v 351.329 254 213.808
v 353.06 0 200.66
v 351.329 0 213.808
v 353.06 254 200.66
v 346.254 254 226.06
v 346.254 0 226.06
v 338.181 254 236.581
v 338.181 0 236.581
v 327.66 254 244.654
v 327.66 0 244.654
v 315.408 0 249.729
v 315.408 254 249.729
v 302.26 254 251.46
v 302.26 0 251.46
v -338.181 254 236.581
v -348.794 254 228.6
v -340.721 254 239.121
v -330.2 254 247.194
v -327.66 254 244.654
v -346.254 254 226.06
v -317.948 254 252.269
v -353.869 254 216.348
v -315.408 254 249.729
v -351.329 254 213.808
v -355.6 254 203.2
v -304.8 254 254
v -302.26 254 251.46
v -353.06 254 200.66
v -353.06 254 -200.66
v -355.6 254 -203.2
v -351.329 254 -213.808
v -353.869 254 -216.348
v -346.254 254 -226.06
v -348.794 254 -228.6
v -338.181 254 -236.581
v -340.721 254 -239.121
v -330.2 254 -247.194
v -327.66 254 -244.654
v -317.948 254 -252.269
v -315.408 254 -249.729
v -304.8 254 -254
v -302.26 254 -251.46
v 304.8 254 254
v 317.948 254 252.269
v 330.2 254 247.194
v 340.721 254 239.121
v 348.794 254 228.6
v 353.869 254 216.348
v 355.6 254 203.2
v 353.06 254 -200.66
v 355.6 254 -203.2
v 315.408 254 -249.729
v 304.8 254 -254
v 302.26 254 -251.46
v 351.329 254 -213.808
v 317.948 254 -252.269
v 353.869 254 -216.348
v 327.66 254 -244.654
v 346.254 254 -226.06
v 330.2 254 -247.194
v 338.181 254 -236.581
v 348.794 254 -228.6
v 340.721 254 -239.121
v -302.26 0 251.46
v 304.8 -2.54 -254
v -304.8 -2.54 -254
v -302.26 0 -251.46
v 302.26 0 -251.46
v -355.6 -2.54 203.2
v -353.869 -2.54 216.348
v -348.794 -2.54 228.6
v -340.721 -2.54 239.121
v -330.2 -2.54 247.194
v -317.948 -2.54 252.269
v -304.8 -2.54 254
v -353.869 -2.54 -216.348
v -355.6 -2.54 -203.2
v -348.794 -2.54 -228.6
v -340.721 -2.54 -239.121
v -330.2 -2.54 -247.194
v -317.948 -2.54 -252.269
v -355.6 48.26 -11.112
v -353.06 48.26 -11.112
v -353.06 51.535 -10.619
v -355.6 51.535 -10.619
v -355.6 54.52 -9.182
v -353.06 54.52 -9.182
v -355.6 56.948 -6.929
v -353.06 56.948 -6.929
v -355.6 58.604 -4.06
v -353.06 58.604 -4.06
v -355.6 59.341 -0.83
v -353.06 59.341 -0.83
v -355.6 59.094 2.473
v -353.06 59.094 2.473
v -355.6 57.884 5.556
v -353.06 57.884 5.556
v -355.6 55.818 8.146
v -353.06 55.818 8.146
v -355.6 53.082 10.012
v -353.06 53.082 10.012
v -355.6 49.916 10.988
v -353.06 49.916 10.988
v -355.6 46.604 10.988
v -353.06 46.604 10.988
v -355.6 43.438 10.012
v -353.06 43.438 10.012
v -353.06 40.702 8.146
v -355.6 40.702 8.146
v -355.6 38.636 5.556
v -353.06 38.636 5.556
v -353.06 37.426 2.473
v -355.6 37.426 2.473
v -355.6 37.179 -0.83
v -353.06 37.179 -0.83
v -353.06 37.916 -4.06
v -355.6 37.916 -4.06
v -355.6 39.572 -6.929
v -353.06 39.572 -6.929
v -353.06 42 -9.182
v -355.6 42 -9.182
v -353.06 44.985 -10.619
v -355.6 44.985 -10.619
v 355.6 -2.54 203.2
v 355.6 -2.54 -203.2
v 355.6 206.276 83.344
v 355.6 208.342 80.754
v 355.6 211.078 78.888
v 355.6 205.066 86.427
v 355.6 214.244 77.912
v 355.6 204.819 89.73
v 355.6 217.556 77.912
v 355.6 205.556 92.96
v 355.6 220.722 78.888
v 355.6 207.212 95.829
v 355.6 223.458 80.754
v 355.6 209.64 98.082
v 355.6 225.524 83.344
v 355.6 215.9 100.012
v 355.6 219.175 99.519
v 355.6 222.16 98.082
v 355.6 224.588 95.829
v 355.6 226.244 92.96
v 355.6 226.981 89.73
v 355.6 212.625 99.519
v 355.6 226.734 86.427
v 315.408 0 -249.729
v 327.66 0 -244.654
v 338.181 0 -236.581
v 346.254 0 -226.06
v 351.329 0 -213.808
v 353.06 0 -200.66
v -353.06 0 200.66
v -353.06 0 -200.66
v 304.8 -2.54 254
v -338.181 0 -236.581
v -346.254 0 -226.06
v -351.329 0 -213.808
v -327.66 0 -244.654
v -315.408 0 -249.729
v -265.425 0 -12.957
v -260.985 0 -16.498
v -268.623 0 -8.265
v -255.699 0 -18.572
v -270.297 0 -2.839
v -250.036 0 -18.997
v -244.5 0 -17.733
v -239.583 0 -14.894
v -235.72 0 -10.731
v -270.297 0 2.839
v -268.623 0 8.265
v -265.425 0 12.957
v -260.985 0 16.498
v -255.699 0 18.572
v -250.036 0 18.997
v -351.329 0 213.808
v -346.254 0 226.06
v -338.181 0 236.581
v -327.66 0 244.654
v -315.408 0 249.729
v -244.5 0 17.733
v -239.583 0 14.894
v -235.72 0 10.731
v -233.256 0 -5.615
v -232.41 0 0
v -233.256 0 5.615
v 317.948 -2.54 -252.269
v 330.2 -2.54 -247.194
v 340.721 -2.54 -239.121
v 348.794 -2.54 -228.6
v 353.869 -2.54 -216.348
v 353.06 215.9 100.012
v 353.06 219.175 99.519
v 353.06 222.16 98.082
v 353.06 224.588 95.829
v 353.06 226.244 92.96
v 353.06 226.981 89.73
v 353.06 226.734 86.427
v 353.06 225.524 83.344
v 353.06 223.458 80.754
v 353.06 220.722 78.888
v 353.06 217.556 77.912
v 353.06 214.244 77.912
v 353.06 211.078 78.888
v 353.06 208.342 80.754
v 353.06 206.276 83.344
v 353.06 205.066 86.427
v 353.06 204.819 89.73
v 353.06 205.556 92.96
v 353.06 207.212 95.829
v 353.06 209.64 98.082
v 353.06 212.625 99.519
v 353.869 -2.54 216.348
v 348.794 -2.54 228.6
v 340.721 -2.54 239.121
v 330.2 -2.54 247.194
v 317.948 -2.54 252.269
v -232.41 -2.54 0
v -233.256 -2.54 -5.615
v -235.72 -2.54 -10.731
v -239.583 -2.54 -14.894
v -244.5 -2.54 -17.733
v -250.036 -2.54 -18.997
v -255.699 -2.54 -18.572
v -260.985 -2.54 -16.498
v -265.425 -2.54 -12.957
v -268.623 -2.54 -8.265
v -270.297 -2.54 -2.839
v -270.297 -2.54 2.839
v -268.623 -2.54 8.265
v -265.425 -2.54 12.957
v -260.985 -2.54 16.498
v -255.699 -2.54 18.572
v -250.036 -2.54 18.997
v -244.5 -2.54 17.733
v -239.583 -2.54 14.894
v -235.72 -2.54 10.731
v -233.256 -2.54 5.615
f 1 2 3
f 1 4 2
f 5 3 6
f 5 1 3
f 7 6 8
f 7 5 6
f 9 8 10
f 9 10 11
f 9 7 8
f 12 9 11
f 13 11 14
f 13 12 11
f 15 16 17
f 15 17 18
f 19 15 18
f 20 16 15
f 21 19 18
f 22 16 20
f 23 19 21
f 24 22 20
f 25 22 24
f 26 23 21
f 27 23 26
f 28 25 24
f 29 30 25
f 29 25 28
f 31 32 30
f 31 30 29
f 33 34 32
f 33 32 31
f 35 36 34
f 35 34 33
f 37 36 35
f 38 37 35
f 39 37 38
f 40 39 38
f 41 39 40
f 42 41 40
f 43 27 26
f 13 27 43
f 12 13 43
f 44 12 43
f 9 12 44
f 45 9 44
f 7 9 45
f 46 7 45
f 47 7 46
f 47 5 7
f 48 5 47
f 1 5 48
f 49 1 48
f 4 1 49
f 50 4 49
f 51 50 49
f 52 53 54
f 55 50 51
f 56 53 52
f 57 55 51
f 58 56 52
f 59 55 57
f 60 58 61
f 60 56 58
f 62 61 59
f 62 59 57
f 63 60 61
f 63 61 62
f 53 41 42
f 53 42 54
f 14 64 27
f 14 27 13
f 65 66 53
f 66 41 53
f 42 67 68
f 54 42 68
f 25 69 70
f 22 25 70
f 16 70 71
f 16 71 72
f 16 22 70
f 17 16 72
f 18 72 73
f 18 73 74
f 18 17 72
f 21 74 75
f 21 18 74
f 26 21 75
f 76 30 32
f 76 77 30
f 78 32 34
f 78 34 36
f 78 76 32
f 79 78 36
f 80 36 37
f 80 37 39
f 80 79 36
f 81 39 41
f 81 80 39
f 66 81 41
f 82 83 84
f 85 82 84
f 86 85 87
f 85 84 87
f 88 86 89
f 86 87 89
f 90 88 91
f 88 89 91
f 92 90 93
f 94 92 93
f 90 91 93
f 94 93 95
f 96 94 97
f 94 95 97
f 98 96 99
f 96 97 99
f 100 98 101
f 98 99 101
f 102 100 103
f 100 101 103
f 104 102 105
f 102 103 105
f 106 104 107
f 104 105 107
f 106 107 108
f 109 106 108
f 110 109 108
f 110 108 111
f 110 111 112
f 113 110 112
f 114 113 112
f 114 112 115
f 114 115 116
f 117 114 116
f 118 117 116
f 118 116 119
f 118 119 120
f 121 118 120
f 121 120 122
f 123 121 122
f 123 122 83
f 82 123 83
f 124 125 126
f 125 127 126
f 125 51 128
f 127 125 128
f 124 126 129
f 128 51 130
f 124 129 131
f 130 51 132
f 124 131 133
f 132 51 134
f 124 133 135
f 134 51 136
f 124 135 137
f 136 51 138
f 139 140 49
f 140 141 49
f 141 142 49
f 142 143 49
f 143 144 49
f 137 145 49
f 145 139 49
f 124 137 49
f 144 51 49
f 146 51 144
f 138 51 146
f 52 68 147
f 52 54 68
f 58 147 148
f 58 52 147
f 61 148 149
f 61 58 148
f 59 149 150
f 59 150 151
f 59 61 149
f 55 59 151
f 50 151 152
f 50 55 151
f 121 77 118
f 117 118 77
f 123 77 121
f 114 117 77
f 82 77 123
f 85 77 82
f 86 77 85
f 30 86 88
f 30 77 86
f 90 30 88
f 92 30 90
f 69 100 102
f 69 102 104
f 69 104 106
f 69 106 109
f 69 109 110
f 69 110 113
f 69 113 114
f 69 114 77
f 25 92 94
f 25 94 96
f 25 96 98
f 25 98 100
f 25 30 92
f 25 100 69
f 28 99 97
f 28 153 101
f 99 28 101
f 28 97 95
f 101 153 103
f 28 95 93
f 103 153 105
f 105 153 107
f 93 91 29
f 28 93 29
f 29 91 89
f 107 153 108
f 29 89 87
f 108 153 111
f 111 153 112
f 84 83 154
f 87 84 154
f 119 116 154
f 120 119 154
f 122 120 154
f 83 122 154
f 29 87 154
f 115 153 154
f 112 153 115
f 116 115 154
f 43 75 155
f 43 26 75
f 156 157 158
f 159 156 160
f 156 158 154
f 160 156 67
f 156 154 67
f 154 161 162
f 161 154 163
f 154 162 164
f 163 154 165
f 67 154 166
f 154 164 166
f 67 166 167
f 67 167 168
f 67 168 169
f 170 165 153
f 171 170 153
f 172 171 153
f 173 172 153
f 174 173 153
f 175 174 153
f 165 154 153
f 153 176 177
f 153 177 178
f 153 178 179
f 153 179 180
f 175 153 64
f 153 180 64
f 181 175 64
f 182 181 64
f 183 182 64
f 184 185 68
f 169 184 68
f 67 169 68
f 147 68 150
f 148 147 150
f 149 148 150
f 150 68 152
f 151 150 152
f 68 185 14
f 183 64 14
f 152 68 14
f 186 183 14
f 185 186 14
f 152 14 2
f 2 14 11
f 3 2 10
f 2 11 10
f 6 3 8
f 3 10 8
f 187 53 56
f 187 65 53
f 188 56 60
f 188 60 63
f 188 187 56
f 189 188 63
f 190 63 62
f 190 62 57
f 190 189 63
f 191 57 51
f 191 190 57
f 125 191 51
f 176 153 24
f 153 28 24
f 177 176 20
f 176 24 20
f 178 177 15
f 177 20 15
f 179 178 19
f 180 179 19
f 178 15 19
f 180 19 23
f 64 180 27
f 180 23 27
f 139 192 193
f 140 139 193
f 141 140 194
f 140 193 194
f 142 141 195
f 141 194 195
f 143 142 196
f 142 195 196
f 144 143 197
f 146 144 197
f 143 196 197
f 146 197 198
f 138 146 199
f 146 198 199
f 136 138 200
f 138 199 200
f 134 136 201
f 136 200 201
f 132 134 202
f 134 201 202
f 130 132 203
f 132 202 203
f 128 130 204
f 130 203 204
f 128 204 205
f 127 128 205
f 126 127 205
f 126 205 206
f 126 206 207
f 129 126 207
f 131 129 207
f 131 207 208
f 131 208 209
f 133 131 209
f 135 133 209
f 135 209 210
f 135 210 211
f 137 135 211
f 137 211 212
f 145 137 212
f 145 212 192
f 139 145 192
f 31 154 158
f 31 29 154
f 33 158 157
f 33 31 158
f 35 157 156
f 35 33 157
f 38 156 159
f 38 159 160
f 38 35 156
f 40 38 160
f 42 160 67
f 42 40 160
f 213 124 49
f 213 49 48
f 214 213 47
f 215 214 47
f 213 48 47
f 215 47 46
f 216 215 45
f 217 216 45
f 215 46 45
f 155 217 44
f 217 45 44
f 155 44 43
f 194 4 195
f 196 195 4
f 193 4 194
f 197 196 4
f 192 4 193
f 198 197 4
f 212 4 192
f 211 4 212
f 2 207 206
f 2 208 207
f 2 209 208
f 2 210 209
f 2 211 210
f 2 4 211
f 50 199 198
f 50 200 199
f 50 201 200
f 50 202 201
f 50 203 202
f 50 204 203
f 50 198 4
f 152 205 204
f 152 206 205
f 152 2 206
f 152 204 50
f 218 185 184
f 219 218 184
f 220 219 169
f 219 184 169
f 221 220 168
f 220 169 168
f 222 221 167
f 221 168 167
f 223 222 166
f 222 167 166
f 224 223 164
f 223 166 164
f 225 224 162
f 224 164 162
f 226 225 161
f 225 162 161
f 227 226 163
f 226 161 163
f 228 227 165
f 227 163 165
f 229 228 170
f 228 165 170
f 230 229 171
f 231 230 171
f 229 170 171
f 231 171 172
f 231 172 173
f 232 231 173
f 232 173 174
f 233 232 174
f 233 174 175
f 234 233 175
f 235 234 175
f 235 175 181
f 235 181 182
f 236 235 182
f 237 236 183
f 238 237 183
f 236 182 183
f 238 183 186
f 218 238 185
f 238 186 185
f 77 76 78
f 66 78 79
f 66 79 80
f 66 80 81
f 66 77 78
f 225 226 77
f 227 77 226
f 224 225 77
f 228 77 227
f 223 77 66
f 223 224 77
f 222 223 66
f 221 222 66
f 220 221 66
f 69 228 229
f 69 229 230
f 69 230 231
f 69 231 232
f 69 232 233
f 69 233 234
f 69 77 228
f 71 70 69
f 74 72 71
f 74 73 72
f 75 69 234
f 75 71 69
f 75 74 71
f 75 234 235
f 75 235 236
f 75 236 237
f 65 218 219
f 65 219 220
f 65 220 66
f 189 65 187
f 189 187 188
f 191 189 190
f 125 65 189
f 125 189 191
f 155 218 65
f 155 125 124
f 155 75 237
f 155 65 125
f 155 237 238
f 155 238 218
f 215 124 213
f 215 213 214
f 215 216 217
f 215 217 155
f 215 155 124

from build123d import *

# Parameters (mm, degrees)
SKETCH1_W                        = 711.2
SKETCH1_H                        = 508
SKETCH1_W_2                      = 706.12
SKETCH1_H_2                      = 502.92
BOSS_EXTRUDE1_DEPTH              = 254
SKETCH2_W                        = 711.2
SKETCH2_H                        = 508
BOSS_EXTRUDE2_DEPTH              = 2.54
FILLET1_R                        = 50.8
SKETCH5_R                        = 19.05
CUT_EXTRUDE1_DEPTH               = 2.54
F_7_8_0_875_DIAMETER_HOLE1_D     = 22.225
F_7_8_0_875_DIAMETER_HOLE1_DEPTH = 2.54
F_7_8_0_875_DIAMETER_HOLE2_D     = 22.225
F_7_8_0_875_DIAMETER_HOLE2_DEPTH = 2.54


with BuildPart() as part:
    # Sketch1 → Boss-Extrude1 (new body)
    with BuildSketch(Plane(origin=(0, 0, 0), x_dir=(1, 0, 0), z_dir=(0, 1, 0))):
        Rectangle(SKETCH1_W, SKETCH1_H)
        Rectangle(SKETCH1_W_2, SKETCH1_H_2, mode=Mode.SUBTRACT)
    extrude(amount=BOSS_EXTRUDE1_DEPTH)

    # Sketch2 → Boss-Extrude2 (add)
    with BuildSketch(Plane.XZ):
        Rectangle(SKETCH2_W, SKETCH2_H)
    extrude(amount=BOSS_EXTRUDE2_DEPTH)

    # Fillet1
    fillet1_edges = [part.edges().sort_by_distance(p)[0] for p in [
        (353.06, 127, 251.46),
        (353.06, 127, -251.46),
        (-353.06, 127, -251.46),
        (-353.06, 127, 251.46),
        (355.6, 125.73, 254),
        (-355.6, 125.73, 254),
        (-355.6, 125.73, -254),
        (355.6, 125.73, -254),
    ]]
    fillet(fillet1_edges, radius=FILLET1_R)

    # Sketch5 → Cut-Extrude1 (cut)
    with BuildSketch(Plane(origin=(0, 0, 0), x_dir=(1, 0, 0), z_dir=(0, 1, 0))):
        with Locations((-251.46, 0)):
            Circle(SKETCH5_R)
    extrude(amount=-CUT_EXTRUDE1_DEPTH, mode=Mode.SUBTRACT)

    # 7/8 (0.875) Diameter Hole1
    with Locations(Plane.ZY.offset(355.6)):
        with Locations((0, 48.26)):
            Hole(F_7_8_0_875_DIAMETER_HOLE1_D / 2, depth=F_7_8_0_875_DIAMETER_HOLE1_DEPTH)

    # 7/8 (0.875) Diameter Hole2
    with Locations(Plane(origin=(355.6, 0, 0), x_dir=(0, 0, -1), z_dir=(1, 0, 0))):
        with Locations((-88.9, 215.9)):
            Hole(F_7_8_0_875_DIAMETER_HOLE2_D / 2, depth=F_7_8_0_875_DIAMETER_HOLE2_DEPTH)


solid = part.part
